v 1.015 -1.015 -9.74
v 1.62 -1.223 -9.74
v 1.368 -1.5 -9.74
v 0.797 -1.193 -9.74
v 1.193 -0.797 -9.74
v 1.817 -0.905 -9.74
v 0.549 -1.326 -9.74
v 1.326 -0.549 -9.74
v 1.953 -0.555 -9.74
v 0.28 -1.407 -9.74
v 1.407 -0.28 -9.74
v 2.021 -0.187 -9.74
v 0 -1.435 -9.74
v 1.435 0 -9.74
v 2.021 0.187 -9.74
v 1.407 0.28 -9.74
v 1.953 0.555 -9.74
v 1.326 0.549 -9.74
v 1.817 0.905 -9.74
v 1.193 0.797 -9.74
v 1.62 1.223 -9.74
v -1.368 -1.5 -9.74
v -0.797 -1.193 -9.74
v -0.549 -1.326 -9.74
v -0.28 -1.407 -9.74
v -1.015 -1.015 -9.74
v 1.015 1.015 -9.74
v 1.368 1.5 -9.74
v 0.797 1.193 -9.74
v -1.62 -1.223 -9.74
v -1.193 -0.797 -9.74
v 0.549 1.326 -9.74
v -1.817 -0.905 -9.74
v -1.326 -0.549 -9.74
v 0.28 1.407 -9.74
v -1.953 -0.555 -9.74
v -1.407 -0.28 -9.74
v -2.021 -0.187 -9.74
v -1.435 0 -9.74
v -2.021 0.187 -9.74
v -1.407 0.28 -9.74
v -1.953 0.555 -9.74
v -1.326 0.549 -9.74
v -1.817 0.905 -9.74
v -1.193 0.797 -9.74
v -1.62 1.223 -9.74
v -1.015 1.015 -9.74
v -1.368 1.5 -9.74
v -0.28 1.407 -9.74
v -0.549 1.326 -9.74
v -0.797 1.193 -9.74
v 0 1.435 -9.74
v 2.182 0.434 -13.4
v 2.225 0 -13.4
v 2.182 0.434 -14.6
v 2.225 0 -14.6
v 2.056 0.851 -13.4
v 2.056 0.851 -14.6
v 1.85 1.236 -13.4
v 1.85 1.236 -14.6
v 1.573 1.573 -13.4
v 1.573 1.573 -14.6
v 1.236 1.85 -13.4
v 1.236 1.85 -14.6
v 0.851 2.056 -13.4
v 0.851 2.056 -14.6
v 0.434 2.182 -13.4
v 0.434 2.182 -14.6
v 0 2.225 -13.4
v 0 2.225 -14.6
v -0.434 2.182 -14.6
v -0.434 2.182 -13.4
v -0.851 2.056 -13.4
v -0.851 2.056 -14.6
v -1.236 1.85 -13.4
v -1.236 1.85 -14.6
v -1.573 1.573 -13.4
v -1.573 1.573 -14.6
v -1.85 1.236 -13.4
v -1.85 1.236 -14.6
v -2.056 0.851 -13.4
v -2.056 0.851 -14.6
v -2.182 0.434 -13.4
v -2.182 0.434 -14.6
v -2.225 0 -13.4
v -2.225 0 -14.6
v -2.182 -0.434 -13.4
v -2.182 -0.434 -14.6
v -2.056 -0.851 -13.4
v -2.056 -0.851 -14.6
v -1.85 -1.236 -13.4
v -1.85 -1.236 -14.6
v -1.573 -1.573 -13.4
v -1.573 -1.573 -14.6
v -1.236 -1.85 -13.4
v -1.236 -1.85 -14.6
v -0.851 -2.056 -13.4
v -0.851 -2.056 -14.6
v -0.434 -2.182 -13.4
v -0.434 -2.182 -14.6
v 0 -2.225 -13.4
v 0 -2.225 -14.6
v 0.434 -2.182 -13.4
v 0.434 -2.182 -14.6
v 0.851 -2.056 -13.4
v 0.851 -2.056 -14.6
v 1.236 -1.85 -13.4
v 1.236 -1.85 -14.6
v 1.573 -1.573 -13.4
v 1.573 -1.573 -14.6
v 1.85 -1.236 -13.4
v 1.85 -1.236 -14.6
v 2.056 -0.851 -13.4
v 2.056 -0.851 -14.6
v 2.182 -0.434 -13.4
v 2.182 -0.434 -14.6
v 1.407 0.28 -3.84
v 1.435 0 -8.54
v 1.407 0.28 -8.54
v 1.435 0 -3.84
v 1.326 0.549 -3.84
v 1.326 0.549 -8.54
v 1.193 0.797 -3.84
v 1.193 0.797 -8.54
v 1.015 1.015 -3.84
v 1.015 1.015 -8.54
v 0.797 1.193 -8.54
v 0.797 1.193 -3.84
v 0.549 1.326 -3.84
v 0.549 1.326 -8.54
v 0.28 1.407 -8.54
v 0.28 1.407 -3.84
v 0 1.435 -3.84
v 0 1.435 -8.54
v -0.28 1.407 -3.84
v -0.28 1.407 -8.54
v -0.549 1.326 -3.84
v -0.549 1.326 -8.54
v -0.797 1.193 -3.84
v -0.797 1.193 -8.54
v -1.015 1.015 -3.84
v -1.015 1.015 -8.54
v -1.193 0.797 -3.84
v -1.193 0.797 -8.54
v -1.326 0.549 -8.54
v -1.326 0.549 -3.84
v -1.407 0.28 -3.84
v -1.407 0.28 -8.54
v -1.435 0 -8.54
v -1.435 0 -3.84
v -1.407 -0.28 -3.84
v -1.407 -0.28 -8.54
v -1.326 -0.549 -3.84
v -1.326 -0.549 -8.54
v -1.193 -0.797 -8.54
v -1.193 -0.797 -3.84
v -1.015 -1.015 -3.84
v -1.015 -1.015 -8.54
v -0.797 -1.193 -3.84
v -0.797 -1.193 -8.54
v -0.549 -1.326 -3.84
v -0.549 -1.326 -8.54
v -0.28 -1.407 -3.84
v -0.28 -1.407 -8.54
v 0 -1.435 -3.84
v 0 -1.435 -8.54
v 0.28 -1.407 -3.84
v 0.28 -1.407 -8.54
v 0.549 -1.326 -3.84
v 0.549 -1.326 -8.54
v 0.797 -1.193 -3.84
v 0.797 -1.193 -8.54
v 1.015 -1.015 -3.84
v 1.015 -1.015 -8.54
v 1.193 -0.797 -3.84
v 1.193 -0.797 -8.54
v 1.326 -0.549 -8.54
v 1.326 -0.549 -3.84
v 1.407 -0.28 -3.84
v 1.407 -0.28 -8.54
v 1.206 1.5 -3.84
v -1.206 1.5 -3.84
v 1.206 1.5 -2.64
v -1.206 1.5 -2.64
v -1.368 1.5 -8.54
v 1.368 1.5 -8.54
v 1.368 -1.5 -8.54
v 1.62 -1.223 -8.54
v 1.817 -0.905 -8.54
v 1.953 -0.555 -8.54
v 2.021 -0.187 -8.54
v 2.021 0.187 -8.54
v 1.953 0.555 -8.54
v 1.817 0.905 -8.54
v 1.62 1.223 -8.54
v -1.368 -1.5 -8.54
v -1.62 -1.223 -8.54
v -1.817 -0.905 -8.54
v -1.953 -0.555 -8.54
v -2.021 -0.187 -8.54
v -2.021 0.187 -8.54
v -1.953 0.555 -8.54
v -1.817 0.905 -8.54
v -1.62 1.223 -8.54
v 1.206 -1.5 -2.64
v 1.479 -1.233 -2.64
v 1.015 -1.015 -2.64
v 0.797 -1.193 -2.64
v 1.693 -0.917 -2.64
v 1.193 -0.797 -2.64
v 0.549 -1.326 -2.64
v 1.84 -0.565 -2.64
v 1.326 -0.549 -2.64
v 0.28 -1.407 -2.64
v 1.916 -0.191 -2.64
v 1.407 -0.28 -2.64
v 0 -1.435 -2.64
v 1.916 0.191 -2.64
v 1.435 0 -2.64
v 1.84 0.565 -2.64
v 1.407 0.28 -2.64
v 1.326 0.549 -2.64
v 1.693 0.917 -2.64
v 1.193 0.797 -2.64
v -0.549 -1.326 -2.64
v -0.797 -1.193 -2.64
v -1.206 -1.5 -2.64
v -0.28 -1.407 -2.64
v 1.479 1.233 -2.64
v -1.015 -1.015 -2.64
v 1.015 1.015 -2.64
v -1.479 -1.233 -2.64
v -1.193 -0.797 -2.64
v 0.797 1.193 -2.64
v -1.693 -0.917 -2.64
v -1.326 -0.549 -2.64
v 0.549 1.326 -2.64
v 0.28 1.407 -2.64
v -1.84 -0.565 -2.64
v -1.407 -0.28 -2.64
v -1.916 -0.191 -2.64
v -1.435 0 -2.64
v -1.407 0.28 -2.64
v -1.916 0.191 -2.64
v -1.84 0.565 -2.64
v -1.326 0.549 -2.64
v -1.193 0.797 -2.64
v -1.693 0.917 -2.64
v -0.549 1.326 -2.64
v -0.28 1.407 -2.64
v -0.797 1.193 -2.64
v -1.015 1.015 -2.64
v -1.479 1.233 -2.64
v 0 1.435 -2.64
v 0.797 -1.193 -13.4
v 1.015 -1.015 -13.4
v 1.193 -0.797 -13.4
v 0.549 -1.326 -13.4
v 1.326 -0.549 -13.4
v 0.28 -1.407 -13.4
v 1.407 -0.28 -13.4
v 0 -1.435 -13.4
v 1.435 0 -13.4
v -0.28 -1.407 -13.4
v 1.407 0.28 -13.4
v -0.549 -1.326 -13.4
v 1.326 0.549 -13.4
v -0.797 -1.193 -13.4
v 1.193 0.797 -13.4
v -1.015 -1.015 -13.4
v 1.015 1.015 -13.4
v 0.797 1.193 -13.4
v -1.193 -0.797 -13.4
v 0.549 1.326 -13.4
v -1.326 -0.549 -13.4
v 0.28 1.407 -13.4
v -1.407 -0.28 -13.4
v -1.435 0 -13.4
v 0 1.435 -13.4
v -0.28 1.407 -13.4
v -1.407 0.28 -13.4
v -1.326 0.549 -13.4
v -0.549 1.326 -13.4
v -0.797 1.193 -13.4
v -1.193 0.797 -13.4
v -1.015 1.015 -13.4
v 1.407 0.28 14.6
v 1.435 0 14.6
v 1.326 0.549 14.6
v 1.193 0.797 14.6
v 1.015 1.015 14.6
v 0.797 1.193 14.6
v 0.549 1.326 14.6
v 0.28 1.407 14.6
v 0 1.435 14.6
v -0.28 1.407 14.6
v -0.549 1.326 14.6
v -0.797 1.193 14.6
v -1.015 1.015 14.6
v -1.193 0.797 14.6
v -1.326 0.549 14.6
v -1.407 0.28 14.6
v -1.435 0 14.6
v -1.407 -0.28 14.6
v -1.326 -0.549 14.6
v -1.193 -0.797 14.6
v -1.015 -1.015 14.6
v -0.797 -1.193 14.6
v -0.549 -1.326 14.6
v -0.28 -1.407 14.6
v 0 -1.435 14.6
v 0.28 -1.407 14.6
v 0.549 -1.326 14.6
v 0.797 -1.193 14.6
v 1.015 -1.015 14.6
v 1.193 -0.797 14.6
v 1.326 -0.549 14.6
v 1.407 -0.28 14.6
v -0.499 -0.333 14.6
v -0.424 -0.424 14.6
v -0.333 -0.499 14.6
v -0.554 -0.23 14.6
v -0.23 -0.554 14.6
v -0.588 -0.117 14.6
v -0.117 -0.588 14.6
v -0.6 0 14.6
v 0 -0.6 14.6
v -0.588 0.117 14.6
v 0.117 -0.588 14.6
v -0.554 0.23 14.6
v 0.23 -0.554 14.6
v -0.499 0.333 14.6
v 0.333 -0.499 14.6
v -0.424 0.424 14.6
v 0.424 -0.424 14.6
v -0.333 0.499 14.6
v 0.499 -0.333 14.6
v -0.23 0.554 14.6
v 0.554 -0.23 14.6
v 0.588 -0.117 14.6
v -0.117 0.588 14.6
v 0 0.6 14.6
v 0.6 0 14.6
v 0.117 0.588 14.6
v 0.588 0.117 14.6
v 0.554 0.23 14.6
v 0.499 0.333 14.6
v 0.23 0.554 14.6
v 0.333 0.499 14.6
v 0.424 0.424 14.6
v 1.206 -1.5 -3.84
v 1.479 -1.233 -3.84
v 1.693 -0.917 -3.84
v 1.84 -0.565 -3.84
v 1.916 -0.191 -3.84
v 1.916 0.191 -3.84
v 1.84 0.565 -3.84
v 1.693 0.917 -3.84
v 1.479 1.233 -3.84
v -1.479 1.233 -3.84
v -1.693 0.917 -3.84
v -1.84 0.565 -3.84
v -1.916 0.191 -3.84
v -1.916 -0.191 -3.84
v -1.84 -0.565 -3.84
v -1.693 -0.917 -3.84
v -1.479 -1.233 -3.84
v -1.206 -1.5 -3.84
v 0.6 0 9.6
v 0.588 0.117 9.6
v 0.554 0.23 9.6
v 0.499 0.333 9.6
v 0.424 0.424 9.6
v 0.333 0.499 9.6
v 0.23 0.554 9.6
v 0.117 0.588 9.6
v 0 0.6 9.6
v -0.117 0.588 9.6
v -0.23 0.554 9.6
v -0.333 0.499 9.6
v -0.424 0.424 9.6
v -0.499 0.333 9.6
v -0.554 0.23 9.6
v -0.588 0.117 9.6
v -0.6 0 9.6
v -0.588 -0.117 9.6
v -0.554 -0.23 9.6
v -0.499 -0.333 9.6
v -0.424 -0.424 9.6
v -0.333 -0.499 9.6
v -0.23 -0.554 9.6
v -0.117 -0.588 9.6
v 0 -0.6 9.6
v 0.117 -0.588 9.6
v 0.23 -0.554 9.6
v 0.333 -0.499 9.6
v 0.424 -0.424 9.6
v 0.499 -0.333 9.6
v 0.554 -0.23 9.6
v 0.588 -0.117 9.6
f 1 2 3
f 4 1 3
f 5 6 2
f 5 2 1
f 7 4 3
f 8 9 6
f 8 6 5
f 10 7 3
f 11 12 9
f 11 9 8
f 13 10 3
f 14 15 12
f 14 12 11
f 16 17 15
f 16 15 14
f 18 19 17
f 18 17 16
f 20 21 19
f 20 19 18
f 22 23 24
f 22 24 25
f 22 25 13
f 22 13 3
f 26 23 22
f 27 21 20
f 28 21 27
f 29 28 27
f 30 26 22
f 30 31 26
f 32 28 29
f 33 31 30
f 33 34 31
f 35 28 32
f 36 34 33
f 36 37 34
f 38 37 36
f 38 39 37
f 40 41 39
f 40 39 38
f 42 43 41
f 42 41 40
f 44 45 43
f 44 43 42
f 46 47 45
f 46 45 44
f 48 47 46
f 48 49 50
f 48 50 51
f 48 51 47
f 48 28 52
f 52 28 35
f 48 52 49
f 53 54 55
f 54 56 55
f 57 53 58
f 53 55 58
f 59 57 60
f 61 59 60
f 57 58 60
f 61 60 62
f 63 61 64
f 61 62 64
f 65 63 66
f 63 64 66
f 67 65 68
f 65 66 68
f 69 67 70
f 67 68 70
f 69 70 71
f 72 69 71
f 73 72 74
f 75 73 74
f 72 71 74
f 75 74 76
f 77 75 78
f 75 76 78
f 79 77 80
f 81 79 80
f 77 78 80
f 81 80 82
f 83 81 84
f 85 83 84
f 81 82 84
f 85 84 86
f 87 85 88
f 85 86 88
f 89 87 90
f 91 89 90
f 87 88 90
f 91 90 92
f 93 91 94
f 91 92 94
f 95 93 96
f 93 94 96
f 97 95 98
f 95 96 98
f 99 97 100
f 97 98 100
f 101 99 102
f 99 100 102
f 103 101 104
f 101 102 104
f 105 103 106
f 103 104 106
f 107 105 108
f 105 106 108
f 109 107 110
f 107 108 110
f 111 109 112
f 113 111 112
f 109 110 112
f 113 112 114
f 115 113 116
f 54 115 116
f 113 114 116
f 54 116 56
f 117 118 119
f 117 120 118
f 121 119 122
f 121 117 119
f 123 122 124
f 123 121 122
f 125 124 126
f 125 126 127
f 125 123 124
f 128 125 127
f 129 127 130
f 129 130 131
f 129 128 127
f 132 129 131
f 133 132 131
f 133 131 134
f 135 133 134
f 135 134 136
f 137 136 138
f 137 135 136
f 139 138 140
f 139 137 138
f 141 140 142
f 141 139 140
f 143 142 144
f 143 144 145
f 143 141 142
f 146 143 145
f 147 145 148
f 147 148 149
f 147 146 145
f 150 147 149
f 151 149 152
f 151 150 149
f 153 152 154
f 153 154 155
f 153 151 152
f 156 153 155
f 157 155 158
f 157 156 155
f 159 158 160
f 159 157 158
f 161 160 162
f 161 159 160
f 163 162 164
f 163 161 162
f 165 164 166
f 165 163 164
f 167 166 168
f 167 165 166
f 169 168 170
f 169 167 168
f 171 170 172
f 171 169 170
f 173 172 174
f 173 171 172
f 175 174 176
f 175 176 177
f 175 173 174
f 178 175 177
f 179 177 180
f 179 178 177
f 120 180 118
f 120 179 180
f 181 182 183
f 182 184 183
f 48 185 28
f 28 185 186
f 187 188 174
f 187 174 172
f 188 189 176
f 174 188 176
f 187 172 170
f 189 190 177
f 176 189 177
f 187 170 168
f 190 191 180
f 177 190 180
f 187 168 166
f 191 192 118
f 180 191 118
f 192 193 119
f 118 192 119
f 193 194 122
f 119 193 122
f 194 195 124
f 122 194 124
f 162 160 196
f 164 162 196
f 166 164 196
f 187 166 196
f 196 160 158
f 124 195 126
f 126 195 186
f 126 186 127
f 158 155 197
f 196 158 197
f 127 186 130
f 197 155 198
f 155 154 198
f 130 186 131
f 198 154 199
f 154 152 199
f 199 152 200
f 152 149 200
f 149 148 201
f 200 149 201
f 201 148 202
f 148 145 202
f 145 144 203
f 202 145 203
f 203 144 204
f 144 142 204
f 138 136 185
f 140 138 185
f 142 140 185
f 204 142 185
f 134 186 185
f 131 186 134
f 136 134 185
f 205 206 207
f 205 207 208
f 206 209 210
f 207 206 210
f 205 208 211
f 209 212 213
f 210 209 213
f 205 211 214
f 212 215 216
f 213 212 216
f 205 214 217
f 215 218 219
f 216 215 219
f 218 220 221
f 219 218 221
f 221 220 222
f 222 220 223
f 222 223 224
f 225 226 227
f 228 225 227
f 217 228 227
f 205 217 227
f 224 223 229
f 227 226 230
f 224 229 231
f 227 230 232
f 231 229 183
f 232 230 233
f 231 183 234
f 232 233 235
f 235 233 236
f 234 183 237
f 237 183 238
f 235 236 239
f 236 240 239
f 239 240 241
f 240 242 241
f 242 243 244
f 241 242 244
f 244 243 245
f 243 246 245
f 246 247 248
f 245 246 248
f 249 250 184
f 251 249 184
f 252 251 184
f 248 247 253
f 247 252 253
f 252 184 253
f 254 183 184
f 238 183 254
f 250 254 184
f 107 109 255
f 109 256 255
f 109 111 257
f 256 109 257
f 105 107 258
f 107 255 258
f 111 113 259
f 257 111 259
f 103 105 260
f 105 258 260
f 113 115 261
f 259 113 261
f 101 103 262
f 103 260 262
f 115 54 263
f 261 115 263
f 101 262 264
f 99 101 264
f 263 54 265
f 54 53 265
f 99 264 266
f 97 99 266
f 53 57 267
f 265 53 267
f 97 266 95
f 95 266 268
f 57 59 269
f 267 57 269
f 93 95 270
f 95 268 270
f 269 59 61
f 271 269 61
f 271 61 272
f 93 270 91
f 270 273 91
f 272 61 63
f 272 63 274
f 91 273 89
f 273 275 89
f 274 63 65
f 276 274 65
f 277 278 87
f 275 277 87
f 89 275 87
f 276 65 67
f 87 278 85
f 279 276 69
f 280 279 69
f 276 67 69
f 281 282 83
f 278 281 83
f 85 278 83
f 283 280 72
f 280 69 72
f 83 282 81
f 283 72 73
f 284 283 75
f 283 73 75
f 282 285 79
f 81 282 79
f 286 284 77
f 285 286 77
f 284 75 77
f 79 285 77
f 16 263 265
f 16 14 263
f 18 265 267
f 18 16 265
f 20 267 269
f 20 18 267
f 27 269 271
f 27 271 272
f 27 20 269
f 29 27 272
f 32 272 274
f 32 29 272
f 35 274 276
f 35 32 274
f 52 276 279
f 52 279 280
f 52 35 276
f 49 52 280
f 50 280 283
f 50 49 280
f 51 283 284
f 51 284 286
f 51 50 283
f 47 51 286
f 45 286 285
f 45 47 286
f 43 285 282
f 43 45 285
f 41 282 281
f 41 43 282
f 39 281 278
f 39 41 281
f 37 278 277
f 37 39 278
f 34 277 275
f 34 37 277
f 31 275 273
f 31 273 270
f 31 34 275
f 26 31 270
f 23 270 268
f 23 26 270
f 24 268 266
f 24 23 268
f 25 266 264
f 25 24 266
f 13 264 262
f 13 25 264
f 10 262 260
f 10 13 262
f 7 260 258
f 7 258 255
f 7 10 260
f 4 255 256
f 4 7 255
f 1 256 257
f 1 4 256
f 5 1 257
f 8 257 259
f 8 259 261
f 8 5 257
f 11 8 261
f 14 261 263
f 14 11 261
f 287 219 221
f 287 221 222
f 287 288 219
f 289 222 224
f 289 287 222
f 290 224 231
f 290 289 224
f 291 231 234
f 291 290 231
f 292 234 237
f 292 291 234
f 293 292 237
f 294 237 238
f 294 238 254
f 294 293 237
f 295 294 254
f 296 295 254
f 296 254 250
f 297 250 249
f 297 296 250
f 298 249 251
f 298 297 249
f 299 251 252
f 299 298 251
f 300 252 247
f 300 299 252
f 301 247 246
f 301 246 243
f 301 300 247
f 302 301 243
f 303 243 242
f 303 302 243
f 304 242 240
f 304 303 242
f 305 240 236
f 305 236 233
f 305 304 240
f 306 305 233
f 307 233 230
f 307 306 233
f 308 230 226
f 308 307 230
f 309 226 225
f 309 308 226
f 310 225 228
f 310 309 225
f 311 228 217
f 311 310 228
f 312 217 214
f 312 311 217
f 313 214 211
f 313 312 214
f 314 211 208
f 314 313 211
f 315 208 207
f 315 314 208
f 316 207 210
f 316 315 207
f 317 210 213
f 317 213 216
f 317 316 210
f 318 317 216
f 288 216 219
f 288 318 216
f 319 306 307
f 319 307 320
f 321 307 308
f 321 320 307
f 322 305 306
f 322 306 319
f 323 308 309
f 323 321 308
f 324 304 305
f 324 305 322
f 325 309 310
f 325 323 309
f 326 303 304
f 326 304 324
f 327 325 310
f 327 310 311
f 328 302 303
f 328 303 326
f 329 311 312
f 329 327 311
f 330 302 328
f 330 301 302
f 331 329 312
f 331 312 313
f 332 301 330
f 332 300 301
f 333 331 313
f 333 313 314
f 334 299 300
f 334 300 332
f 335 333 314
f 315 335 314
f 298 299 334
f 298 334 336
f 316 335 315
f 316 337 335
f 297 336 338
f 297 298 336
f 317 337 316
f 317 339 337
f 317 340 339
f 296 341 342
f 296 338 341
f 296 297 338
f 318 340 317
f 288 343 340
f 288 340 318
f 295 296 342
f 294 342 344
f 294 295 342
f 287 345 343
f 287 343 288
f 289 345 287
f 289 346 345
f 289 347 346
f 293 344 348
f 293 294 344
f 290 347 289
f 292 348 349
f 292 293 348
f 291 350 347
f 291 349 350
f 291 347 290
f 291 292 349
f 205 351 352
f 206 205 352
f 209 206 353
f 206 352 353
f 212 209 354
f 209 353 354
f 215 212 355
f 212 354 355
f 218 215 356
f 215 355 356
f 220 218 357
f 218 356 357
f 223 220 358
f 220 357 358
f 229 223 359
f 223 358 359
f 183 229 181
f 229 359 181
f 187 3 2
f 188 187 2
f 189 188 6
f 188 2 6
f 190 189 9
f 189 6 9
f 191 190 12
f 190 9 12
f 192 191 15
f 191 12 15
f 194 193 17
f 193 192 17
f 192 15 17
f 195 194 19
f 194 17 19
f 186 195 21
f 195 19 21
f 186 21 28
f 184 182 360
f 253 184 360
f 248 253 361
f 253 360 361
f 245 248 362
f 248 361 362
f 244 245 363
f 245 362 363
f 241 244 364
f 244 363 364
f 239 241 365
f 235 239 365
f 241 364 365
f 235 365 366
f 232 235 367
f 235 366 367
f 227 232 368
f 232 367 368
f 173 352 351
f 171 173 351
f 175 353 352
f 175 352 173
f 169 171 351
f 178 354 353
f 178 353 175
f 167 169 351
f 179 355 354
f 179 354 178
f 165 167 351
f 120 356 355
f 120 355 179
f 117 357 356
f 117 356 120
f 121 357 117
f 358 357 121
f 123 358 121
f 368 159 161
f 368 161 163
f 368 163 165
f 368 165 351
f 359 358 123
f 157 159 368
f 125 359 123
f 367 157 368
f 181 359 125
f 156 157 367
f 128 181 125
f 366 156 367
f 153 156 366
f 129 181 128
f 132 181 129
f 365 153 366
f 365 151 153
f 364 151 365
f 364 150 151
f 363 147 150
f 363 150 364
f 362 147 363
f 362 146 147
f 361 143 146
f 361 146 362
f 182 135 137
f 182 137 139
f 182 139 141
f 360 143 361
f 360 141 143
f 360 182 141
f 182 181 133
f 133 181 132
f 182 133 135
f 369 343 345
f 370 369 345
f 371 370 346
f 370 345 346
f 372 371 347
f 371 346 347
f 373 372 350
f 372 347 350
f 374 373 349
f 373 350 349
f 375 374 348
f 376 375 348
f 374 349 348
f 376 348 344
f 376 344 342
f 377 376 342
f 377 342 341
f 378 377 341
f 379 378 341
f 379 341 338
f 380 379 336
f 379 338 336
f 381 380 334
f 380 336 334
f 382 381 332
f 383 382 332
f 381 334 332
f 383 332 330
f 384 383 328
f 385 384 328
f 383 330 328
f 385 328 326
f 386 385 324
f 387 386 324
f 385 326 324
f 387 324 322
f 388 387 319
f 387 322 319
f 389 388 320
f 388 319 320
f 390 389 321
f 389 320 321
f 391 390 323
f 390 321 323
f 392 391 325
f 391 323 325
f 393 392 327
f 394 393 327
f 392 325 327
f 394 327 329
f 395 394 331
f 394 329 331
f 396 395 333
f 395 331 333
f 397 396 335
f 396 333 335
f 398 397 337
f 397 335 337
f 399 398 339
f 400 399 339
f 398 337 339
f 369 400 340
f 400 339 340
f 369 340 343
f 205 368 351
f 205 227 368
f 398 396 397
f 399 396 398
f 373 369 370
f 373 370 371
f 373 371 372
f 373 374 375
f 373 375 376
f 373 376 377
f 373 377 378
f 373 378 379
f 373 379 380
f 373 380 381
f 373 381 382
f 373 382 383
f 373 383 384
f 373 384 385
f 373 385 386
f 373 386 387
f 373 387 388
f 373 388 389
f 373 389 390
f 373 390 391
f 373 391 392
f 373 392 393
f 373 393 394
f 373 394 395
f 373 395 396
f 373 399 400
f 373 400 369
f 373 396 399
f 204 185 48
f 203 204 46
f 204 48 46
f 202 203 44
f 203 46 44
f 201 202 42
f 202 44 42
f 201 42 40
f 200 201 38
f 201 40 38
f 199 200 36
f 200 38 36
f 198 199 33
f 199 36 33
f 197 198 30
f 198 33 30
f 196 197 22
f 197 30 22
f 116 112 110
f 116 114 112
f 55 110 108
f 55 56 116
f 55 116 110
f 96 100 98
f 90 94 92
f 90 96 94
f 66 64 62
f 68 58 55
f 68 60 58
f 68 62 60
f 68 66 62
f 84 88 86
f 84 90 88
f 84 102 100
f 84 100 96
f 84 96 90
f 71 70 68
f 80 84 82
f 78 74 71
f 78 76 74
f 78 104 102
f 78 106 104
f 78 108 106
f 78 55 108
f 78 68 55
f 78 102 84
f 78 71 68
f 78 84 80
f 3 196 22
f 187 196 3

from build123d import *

# Parameters (mm, degrees)
SKETCH1_R           = 1.435
BOSS_EXTRUDE1_DEPTH = 14.6
SKETCH2_R           = 0.6
CUT_EXTRUDE1_DEPTH  = 5
SKETCH3_W           = 0.49
SKETCH3_H           = 1.2
SKETCH3_W_2         = 0.595
SKETCH3_W_3         = 0.79
SKETCH4_W           = 4
SKETCH4_H           = 1
CUT_EXTRUDE2_DEPTH  = 24.34


with BuildPart() as part:
    # Sketch1 → Boss-Extrude1 (new body, symmetric)
    with BuildSketch(Plane.XY):
        Circle(SKETCH1_R)
    extrude(amount=BOSS_EXTRUDE1_DEPTH, both=True)

    # Sketch2 → Cut-Extrude1 (cut)
    with BuildSketch(Plane.XY.offset(14.6)):
        Circle(SKETCH2_R)
    extrude(amount=-CUT_EXTRUDE1_DEPTH, mode=Mode.SUBTRACT)

    # Sketch3 → Revolve1 (revolve)
    with BuildSketch(Plane(origin=(0, 0, 0), x_dir=(1, 0, 0), z_dir=(0, 1, 0))):
        with Locations((1.68, 3.24)):
            Rectangle(SKETCH3_W, SKETCH3_H)
        with Locations((1.7325, 9.14)):
            Rectangle(SKETCH3_W_2, SKETCH3_H)
        with Locations((1.83, 14)):
            Rectangle(SKETCH3_W_3, SKETCH3_H)
    revolve(axis=Axis((0, 0, -14.6), (0, 0, 1)))

    # Sketch4 → Cut-Extrude2 (cut)
    with BuildSketch(Plane.XY.offset(14.6)):
        with Locations((0, 2)):
            Rectangle(SKETCH4_W, SKETCH4_H)
        with Locations((0, -2)):
            Rectangle(SKETCH4_W, SKETCH4_H)
    extrude(amount=-CUT_EXTRUDE2_DEPTH, mode=Mode.SUBTRACT)


solid = part.part
